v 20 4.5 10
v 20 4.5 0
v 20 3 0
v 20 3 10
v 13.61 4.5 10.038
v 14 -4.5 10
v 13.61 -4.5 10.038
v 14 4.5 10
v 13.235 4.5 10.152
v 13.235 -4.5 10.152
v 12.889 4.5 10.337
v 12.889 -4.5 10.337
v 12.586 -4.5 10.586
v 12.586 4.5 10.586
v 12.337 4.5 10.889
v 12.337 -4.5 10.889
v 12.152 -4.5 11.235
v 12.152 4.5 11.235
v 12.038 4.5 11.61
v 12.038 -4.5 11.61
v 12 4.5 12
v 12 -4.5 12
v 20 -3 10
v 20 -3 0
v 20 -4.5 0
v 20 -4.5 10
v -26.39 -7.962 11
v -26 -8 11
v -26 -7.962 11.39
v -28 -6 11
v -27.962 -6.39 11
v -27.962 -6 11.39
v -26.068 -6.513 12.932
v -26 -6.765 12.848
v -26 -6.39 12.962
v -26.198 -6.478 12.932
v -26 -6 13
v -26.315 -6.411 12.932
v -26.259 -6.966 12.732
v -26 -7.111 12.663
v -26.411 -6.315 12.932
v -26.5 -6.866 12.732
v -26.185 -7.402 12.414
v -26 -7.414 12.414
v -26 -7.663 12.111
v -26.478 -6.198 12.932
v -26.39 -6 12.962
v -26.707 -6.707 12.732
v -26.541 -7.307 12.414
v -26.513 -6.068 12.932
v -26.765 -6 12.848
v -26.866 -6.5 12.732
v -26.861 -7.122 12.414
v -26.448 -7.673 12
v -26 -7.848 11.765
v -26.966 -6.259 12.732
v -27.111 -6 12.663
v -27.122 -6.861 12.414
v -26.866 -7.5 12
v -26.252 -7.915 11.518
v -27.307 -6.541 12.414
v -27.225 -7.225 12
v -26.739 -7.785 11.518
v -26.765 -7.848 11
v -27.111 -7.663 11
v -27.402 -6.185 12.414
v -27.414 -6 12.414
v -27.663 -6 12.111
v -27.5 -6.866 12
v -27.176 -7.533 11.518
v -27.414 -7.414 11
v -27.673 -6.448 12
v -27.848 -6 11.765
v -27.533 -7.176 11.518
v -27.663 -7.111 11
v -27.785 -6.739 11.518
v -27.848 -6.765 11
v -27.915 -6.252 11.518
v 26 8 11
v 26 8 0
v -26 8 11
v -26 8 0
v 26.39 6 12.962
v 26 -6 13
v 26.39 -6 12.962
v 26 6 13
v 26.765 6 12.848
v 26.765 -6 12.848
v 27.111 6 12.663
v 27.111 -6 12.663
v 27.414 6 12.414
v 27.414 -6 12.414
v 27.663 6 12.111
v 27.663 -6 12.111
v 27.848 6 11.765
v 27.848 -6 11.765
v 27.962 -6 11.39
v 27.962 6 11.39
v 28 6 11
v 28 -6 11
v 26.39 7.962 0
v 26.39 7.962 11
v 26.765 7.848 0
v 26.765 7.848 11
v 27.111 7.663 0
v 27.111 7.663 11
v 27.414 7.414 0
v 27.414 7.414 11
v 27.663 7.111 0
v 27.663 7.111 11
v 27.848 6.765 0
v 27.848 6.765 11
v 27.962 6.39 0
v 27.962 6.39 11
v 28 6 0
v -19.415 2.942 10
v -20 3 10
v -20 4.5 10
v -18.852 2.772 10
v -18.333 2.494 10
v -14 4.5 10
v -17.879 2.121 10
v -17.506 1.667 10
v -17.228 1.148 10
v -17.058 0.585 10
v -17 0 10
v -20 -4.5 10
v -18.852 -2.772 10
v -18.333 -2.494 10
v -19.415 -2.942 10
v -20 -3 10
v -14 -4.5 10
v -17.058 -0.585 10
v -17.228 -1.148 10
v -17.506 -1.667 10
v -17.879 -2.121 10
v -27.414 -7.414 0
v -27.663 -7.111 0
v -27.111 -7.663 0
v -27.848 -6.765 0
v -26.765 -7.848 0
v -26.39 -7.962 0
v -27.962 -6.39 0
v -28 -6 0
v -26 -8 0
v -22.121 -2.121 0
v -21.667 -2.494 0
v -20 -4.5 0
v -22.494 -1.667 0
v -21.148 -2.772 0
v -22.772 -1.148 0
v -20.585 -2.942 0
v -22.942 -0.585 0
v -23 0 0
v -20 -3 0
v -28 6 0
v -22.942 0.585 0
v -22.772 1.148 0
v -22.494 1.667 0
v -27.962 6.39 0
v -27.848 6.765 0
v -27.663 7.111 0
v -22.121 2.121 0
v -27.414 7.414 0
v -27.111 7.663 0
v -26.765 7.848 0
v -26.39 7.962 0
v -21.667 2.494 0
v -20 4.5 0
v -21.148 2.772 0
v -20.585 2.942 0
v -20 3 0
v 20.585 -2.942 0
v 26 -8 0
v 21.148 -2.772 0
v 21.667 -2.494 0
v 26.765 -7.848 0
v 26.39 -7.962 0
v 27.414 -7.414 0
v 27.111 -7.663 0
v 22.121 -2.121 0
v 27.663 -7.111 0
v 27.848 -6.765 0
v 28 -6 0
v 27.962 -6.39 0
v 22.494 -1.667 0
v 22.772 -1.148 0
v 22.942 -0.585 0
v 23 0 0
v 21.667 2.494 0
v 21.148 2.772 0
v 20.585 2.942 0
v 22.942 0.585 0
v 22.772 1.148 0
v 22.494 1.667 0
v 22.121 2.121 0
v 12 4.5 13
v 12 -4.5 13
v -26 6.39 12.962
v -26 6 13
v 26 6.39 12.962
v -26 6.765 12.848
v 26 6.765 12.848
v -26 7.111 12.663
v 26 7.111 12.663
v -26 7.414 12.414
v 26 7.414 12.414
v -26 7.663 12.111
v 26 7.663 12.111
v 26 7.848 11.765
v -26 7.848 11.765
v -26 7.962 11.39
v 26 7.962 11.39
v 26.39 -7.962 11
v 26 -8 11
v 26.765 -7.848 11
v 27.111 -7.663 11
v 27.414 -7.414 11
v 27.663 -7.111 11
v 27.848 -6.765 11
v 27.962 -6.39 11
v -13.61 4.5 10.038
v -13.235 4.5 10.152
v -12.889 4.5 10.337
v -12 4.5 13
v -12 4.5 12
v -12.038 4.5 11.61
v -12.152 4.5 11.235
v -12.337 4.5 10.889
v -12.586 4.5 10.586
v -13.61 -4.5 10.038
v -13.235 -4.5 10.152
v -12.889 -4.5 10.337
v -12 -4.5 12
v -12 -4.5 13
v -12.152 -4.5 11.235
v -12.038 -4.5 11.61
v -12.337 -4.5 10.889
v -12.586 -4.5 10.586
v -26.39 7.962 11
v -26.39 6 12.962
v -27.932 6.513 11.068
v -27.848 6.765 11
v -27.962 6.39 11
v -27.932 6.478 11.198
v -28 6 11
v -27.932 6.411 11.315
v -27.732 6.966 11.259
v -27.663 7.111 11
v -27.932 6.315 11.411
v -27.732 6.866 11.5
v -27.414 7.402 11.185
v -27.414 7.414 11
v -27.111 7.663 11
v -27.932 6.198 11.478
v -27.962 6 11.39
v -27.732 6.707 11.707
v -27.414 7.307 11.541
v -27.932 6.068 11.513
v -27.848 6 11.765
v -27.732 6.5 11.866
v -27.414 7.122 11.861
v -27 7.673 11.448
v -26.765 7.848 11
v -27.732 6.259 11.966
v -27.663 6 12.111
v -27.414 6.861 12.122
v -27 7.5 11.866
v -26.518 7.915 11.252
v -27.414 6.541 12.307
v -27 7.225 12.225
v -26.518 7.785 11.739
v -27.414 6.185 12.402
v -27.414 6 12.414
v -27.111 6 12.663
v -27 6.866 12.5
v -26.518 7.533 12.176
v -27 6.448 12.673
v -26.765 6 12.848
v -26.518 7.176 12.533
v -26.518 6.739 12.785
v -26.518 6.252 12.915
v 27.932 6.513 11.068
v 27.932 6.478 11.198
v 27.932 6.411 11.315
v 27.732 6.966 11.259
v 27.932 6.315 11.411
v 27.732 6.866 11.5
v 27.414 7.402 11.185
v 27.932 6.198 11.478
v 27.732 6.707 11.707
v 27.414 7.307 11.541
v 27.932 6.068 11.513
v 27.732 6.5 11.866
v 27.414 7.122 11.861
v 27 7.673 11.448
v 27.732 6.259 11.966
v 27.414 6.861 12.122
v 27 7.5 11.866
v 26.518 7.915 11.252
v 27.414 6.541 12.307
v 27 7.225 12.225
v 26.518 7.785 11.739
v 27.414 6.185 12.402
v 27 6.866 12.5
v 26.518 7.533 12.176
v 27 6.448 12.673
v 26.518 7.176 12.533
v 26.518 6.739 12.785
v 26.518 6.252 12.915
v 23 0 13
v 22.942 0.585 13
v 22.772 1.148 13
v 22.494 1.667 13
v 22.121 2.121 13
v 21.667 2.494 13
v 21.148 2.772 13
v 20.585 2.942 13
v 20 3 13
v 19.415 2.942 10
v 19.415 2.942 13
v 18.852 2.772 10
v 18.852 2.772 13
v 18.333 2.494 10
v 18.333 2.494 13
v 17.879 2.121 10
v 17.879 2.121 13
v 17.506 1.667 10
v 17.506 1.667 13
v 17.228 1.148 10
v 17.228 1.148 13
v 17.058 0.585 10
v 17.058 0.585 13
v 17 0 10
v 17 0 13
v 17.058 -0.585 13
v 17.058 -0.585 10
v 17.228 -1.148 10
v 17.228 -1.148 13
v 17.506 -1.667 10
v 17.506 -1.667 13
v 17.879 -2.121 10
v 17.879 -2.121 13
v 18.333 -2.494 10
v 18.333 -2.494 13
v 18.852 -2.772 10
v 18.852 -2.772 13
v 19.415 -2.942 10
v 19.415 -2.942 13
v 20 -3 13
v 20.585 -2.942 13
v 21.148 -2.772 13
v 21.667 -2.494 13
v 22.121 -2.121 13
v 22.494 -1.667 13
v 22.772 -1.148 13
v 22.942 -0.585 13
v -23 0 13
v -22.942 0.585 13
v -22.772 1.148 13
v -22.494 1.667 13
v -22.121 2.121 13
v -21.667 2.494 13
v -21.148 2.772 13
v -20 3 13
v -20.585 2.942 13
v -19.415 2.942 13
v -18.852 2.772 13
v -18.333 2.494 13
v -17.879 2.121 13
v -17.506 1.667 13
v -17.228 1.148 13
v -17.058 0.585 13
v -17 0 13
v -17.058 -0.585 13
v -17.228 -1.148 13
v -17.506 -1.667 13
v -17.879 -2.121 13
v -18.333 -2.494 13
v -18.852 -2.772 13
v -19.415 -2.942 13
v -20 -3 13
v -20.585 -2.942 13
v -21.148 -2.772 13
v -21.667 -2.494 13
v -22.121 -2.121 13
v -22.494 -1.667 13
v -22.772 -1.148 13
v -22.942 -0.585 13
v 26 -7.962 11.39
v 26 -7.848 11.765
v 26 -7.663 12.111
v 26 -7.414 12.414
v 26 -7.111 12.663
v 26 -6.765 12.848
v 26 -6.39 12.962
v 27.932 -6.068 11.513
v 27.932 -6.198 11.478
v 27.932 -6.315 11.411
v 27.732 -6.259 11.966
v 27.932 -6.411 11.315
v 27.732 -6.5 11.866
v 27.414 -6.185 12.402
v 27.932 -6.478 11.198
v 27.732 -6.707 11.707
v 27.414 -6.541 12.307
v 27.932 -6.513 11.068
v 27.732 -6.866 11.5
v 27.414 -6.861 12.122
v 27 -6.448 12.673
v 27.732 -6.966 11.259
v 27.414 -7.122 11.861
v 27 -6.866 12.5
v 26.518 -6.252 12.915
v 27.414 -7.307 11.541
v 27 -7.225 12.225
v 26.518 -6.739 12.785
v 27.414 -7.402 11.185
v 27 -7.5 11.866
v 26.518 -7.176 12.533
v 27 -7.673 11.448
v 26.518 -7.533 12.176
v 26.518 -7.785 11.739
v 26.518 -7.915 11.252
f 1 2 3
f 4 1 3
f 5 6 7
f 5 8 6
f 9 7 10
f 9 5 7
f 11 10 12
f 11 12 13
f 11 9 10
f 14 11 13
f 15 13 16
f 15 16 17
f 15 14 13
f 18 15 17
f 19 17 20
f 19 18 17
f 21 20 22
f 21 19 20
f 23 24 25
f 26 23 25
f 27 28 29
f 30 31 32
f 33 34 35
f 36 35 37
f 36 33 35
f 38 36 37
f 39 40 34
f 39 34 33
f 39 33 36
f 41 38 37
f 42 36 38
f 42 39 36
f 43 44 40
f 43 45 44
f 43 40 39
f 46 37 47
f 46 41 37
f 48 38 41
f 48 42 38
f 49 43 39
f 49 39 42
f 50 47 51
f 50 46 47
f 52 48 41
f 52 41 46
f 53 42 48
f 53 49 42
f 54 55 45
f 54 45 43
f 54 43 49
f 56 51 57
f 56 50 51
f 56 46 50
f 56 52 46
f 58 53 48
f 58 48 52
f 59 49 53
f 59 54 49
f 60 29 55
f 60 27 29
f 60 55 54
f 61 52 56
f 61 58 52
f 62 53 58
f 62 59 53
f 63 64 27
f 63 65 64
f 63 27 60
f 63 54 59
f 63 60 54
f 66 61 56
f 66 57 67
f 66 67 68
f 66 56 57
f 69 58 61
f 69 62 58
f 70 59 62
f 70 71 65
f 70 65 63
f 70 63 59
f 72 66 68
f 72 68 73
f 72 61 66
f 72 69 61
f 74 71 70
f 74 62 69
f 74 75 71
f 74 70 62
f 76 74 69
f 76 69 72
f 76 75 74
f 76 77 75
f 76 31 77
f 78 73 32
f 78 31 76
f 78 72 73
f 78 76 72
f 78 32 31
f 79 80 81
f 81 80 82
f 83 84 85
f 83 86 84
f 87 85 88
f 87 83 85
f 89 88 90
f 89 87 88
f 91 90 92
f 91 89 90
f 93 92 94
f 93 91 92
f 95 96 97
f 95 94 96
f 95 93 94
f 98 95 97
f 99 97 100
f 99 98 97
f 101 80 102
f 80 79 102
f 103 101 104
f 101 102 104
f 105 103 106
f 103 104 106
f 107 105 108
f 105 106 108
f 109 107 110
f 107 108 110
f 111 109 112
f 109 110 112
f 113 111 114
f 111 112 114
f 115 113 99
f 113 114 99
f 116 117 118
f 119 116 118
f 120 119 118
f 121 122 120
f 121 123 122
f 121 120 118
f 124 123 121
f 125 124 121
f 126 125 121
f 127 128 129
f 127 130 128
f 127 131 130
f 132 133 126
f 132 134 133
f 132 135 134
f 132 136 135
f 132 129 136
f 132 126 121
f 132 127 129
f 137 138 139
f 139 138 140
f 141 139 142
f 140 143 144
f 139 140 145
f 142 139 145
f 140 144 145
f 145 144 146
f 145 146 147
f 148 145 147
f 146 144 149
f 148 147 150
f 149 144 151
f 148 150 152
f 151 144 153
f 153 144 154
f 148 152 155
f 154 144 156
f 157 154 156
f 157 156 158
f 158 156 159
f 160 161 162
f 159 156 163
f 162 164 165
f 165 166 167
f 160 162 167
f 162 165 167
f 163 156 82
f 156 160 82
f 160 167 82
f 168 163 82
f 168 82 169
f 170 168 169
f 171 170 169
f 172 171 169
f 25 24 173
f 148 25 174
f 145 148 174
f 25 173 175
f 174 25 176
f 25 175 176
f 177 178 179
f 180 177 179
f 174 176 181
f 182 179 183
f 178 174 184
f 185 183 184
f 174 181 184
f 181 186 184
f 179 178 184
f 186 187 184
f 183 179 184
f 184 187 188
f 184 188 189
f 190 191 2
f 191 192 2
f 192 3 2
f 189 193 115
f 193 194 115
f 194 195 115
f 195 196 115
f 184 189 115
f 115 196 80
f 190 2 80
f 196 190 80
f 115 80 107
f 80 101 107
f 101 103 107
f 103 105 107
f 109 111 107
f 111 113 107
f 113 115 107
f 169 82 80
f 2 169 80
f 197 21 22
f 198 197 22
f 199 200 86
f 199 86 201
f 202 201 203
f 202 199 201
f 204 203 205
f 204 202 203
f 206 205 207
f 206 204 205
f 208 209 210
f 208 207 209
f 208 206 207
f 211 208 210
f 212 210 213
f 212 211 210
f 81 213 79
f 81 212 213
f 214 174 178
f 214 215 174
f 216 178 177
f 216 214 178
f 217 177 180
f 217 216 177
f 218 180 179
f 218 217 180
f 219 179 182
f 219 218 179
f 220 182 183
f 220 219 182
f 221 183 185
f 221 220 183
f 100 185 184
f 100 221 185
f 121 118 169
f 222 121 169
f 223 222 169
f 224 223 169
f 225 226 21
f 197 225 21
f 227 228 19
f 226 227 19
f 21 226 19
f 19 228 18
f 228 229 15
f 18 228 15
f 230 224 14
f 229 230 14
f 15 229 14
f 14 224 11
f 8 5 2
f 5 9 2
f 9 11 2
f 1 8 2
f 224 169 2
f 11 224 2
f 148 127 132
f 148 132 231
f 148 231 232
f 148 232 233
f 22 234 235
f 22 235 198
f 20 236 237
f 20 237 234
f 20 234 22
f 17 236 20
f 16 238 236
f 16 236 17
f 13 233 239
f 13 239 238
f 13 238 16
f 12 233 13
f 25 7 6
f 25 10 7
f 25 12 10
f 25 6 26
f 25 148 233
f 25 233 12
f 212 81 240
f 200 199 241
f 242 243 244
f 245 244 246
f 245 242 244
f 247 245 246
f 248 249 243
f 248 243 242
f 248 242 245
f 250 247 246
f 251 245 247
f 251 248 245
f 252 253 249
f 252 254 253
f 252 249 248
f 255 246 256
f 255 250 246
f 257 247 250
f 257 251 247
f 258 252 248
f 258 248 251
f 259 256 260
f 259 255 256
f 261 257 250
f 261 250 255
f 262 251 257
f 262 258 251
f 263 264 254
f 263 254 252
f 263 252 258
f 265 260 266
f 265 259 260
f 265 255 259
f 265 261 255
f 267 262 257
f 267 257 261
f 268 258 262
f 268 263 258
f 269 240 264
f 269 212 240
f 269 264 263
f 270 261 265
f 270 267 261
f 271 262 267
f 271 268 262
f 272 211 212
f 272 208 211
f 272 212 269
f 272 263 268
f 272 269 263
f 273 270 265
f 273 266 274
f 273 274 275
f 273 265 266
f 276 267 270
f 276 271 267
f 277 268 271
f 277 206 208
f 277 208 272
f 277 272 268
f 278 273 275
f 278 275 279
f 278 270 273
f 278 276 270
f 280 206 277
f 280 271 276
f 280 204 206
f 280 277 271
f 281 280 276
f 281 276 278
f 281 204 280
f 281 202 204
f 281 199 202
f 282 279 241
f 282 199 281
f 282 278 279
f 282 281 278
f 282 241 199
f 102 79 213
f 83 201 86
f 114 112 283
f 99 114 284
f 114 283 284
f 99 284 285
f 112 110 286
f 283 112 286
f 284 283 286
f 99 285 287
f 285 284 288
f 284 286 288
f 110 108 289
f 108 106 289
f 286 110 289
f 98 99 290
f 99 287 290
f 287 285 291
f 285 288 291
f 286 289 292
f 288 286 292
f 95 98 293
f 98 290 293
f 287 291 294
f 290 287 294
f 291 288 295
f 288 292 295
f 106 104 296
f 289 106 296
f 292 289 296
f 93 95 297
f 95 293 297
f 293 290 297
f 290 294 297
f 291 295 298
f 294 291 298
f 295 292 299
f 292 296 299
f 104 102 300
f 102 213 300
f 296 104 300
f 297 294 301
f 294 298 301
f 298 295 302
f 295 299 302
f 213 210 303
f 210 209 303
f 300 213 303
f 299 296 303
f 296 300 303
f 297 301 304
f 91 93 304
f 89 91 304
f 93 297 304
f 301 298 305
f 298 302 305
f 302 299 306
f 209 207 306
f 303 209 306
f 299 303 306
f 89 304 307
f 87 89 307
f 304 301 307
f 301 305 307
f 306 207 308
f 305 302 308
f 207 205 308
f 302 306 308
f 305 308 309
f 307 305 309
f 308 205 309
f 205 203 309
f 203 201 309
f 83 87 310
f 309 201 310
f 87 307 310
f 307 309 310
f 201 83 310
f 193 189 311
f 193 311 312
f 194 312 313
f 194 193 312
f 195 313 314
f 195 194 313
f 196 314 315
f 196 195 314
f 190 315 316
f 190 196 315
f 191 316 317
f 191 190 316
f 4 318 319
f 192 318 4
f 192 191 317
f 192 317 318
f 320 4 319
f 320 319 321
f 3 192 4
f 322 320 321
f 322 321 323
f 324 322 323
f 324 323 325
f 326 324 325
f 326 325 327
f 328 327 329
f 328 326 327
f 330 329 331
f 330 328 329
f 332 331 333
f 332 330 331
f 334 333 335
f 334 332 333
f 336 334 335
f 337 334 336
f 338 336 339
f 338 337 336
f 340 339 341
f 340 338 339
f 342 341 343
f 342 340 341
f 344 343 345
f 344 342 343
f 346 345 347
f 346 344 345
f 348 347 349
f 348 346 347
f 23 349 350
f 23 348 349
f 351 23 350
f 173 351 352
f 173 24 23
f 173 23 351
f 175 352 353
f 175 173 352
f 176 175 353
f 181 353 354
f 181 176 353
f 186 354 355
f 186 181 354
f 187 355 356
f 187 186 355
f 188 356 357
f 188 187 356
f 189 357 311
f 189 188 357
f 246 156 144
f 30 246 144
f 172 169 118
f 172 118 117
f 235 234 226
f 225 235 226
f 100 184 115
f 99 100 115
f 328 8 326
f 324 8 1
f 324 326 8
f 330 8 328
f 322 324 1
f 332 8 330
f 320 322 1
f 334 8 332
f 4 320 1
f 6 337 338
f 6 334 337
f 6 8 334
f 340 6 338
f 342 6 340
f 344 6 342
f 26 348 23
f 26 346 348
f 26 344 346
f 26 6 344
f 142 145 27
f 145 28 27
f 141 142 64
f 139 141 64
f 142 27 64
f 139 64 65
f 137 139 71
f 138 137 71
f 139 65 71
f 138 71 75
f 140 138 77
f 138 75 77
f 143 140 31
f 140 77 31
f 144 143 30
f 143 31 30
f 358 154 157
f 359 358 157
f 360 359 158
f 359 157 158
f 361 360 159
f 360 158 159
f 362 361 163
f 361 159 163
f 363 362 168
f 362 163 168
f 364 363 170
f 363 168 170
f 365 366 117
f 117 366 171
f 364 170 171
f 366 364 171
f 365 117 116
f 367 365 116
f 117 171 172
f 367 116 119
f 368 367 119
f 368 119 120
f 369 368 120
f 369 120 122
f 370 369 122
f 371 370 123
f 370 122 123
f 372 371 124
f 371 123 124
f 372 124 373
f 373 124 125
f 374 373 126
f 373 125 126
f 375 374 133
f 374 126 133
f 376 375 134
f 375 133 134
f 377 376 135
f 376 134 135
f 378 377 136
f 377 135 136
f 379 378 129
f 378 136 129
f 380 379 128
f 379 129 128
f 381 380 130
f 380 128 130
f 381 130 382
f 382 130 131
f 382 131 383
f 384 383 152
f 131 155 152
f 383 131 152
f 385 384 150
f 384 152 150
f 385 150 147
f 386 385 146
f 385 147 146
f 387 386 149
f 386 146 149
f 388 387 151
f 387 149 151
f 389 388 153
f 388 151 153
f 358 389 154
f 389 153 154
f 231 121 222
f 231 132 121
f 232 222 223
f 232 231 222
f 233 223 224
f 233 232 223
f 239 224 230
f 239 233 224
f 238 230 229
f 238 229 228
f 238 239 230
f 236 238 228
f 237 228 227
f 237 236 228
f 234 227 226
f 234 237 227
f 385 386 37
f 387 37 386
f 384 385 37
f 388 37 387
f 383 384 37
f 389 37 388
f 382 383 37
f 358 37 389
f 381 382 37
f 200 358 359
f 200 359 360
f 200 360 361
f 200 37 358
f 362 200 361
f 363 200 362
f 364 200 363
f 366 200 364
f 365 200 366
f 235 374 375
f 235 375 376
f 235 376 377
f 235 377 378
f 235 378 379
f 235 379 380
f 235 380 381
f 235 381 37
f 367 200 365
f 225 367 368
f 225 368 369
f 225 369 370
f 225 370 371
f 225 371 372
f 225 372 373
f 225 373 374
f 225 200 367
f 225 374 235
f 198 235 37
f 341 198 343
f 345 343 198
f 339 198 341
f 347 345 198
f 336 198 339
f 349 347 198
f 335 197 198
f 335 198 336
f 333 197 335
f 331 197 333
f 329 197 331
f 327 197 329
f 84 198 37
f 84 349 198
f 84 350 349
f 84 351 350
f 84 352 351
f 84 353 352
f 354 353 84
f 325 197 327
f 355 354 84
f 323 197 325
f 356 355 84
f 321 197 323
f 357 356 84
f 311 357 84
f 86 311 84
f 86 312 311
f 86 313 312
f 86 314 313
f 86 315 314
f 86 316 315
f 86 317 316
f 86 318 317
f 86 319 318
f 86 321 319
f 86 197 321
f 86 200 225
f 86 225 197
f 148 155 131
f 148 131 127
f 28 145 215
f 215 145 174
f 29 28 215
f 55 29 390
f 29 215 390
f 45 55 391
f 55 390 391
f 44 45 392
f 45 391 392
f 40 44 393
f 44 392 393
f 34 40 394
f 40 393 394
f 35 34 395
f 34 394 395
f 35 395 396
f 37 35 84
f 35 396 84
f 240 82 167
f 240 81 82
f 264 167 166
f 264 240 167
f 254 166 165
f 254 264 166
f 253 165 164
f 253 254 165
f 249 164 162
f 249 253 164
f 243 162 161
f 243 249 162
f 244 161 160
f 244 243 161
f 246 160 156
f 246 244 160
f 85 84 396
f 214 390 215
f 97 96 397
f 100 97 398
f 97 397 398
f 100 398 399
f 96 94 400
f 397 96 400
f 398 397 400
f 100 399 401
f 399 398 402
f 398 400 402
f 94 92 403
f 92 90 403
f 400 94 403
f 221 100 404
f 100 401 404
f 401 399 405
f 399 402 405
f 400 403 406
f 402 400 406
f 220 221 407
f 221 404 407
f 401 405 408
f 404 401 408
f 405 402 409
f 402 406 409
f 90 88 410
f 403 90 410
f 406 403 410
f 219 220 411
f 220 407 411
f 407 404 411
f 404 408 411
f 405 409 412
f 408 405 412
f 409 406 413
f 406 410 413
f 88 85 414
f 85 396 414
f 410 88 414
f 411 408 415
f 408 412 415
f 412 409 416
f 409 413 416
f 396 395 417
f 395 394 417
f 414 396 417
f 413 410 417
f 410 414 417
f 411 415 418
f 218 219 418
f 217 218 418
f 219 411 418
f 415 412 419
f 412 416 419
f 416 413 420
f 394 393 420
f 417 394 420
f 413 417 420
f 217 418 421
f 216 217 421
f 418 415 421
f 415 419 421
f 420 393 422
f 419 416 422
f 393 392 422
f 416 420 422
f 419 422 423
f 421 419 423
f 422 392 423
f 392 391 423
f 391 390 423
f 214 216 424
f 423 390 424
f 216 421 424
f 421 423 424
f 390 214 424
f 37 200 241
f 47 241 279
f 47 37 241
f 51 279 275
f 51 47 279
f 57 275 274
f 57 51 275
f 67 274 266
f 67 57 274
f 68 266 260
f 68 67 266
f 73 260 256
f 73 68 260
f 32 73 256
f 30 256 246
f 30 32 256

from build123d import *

# Parameters (mm, degrees)
F0_R     = 3
F1_DEPTH = 13
F2_W     = 40
F2_H     = 9
F3_DEPTH = 10
F4_R     = 2


with BuildPart() as f1:
    # F0 (on Top) → F1 (new body)
    with BuildSketch(Plane.XY):
        Polygon((-28, -8), (28, -8), (28, 0), (28, 8), (0, 8), (-28, 8), (-28, 0), align=None)
        with BuildLine():
            ThreePointArc((-17, 0), (-20, -3), (-23, 0))
            ThreePointArc((-23, 0), (-20, 3), (-17, 0))
        make_face(mode=Mode.SUBTRACT)
        Polygon((-12, 4.5), (0, 4.5), (12, 4.5), (12, -4.5), (-12, -4.5), align=None, mode=Mode.SUBTRACT)
        with Locations((20, 0)):
            Circle(F0_R, mode=Mode.SUBTRACT)
    extrude(amount=F1_DEPTH)

    # F2 (on face) → F3 (cut)
    with BuildSketch(Plane(origin=(0, 0, 0), x_dir=(1, 0, 0), z_dir=(0, 0, -1))):
        Rectangle(F2_W, F2_H)
    extrude(amount=-F3_DEPTH, mode=Mode.SUBTRACT)

    # F4
    f4_edges = [f1.edges().sort_by_distance(p)[0] for p in [
        (-28, -8, 6.5),
        (0, -8, 13),
        (0, 8, 13),
        (-28, 8, 6.5),
        (-28, 0, 13),
        (28, 8, 6.5),
        (28, 0, 13),
        (28, -8, 6.5),
        (-12, 0, 10),
        (12, 0, 10),
    ]]
    fillet(f4_edges, radius=F4_R)


solid = f1.part
